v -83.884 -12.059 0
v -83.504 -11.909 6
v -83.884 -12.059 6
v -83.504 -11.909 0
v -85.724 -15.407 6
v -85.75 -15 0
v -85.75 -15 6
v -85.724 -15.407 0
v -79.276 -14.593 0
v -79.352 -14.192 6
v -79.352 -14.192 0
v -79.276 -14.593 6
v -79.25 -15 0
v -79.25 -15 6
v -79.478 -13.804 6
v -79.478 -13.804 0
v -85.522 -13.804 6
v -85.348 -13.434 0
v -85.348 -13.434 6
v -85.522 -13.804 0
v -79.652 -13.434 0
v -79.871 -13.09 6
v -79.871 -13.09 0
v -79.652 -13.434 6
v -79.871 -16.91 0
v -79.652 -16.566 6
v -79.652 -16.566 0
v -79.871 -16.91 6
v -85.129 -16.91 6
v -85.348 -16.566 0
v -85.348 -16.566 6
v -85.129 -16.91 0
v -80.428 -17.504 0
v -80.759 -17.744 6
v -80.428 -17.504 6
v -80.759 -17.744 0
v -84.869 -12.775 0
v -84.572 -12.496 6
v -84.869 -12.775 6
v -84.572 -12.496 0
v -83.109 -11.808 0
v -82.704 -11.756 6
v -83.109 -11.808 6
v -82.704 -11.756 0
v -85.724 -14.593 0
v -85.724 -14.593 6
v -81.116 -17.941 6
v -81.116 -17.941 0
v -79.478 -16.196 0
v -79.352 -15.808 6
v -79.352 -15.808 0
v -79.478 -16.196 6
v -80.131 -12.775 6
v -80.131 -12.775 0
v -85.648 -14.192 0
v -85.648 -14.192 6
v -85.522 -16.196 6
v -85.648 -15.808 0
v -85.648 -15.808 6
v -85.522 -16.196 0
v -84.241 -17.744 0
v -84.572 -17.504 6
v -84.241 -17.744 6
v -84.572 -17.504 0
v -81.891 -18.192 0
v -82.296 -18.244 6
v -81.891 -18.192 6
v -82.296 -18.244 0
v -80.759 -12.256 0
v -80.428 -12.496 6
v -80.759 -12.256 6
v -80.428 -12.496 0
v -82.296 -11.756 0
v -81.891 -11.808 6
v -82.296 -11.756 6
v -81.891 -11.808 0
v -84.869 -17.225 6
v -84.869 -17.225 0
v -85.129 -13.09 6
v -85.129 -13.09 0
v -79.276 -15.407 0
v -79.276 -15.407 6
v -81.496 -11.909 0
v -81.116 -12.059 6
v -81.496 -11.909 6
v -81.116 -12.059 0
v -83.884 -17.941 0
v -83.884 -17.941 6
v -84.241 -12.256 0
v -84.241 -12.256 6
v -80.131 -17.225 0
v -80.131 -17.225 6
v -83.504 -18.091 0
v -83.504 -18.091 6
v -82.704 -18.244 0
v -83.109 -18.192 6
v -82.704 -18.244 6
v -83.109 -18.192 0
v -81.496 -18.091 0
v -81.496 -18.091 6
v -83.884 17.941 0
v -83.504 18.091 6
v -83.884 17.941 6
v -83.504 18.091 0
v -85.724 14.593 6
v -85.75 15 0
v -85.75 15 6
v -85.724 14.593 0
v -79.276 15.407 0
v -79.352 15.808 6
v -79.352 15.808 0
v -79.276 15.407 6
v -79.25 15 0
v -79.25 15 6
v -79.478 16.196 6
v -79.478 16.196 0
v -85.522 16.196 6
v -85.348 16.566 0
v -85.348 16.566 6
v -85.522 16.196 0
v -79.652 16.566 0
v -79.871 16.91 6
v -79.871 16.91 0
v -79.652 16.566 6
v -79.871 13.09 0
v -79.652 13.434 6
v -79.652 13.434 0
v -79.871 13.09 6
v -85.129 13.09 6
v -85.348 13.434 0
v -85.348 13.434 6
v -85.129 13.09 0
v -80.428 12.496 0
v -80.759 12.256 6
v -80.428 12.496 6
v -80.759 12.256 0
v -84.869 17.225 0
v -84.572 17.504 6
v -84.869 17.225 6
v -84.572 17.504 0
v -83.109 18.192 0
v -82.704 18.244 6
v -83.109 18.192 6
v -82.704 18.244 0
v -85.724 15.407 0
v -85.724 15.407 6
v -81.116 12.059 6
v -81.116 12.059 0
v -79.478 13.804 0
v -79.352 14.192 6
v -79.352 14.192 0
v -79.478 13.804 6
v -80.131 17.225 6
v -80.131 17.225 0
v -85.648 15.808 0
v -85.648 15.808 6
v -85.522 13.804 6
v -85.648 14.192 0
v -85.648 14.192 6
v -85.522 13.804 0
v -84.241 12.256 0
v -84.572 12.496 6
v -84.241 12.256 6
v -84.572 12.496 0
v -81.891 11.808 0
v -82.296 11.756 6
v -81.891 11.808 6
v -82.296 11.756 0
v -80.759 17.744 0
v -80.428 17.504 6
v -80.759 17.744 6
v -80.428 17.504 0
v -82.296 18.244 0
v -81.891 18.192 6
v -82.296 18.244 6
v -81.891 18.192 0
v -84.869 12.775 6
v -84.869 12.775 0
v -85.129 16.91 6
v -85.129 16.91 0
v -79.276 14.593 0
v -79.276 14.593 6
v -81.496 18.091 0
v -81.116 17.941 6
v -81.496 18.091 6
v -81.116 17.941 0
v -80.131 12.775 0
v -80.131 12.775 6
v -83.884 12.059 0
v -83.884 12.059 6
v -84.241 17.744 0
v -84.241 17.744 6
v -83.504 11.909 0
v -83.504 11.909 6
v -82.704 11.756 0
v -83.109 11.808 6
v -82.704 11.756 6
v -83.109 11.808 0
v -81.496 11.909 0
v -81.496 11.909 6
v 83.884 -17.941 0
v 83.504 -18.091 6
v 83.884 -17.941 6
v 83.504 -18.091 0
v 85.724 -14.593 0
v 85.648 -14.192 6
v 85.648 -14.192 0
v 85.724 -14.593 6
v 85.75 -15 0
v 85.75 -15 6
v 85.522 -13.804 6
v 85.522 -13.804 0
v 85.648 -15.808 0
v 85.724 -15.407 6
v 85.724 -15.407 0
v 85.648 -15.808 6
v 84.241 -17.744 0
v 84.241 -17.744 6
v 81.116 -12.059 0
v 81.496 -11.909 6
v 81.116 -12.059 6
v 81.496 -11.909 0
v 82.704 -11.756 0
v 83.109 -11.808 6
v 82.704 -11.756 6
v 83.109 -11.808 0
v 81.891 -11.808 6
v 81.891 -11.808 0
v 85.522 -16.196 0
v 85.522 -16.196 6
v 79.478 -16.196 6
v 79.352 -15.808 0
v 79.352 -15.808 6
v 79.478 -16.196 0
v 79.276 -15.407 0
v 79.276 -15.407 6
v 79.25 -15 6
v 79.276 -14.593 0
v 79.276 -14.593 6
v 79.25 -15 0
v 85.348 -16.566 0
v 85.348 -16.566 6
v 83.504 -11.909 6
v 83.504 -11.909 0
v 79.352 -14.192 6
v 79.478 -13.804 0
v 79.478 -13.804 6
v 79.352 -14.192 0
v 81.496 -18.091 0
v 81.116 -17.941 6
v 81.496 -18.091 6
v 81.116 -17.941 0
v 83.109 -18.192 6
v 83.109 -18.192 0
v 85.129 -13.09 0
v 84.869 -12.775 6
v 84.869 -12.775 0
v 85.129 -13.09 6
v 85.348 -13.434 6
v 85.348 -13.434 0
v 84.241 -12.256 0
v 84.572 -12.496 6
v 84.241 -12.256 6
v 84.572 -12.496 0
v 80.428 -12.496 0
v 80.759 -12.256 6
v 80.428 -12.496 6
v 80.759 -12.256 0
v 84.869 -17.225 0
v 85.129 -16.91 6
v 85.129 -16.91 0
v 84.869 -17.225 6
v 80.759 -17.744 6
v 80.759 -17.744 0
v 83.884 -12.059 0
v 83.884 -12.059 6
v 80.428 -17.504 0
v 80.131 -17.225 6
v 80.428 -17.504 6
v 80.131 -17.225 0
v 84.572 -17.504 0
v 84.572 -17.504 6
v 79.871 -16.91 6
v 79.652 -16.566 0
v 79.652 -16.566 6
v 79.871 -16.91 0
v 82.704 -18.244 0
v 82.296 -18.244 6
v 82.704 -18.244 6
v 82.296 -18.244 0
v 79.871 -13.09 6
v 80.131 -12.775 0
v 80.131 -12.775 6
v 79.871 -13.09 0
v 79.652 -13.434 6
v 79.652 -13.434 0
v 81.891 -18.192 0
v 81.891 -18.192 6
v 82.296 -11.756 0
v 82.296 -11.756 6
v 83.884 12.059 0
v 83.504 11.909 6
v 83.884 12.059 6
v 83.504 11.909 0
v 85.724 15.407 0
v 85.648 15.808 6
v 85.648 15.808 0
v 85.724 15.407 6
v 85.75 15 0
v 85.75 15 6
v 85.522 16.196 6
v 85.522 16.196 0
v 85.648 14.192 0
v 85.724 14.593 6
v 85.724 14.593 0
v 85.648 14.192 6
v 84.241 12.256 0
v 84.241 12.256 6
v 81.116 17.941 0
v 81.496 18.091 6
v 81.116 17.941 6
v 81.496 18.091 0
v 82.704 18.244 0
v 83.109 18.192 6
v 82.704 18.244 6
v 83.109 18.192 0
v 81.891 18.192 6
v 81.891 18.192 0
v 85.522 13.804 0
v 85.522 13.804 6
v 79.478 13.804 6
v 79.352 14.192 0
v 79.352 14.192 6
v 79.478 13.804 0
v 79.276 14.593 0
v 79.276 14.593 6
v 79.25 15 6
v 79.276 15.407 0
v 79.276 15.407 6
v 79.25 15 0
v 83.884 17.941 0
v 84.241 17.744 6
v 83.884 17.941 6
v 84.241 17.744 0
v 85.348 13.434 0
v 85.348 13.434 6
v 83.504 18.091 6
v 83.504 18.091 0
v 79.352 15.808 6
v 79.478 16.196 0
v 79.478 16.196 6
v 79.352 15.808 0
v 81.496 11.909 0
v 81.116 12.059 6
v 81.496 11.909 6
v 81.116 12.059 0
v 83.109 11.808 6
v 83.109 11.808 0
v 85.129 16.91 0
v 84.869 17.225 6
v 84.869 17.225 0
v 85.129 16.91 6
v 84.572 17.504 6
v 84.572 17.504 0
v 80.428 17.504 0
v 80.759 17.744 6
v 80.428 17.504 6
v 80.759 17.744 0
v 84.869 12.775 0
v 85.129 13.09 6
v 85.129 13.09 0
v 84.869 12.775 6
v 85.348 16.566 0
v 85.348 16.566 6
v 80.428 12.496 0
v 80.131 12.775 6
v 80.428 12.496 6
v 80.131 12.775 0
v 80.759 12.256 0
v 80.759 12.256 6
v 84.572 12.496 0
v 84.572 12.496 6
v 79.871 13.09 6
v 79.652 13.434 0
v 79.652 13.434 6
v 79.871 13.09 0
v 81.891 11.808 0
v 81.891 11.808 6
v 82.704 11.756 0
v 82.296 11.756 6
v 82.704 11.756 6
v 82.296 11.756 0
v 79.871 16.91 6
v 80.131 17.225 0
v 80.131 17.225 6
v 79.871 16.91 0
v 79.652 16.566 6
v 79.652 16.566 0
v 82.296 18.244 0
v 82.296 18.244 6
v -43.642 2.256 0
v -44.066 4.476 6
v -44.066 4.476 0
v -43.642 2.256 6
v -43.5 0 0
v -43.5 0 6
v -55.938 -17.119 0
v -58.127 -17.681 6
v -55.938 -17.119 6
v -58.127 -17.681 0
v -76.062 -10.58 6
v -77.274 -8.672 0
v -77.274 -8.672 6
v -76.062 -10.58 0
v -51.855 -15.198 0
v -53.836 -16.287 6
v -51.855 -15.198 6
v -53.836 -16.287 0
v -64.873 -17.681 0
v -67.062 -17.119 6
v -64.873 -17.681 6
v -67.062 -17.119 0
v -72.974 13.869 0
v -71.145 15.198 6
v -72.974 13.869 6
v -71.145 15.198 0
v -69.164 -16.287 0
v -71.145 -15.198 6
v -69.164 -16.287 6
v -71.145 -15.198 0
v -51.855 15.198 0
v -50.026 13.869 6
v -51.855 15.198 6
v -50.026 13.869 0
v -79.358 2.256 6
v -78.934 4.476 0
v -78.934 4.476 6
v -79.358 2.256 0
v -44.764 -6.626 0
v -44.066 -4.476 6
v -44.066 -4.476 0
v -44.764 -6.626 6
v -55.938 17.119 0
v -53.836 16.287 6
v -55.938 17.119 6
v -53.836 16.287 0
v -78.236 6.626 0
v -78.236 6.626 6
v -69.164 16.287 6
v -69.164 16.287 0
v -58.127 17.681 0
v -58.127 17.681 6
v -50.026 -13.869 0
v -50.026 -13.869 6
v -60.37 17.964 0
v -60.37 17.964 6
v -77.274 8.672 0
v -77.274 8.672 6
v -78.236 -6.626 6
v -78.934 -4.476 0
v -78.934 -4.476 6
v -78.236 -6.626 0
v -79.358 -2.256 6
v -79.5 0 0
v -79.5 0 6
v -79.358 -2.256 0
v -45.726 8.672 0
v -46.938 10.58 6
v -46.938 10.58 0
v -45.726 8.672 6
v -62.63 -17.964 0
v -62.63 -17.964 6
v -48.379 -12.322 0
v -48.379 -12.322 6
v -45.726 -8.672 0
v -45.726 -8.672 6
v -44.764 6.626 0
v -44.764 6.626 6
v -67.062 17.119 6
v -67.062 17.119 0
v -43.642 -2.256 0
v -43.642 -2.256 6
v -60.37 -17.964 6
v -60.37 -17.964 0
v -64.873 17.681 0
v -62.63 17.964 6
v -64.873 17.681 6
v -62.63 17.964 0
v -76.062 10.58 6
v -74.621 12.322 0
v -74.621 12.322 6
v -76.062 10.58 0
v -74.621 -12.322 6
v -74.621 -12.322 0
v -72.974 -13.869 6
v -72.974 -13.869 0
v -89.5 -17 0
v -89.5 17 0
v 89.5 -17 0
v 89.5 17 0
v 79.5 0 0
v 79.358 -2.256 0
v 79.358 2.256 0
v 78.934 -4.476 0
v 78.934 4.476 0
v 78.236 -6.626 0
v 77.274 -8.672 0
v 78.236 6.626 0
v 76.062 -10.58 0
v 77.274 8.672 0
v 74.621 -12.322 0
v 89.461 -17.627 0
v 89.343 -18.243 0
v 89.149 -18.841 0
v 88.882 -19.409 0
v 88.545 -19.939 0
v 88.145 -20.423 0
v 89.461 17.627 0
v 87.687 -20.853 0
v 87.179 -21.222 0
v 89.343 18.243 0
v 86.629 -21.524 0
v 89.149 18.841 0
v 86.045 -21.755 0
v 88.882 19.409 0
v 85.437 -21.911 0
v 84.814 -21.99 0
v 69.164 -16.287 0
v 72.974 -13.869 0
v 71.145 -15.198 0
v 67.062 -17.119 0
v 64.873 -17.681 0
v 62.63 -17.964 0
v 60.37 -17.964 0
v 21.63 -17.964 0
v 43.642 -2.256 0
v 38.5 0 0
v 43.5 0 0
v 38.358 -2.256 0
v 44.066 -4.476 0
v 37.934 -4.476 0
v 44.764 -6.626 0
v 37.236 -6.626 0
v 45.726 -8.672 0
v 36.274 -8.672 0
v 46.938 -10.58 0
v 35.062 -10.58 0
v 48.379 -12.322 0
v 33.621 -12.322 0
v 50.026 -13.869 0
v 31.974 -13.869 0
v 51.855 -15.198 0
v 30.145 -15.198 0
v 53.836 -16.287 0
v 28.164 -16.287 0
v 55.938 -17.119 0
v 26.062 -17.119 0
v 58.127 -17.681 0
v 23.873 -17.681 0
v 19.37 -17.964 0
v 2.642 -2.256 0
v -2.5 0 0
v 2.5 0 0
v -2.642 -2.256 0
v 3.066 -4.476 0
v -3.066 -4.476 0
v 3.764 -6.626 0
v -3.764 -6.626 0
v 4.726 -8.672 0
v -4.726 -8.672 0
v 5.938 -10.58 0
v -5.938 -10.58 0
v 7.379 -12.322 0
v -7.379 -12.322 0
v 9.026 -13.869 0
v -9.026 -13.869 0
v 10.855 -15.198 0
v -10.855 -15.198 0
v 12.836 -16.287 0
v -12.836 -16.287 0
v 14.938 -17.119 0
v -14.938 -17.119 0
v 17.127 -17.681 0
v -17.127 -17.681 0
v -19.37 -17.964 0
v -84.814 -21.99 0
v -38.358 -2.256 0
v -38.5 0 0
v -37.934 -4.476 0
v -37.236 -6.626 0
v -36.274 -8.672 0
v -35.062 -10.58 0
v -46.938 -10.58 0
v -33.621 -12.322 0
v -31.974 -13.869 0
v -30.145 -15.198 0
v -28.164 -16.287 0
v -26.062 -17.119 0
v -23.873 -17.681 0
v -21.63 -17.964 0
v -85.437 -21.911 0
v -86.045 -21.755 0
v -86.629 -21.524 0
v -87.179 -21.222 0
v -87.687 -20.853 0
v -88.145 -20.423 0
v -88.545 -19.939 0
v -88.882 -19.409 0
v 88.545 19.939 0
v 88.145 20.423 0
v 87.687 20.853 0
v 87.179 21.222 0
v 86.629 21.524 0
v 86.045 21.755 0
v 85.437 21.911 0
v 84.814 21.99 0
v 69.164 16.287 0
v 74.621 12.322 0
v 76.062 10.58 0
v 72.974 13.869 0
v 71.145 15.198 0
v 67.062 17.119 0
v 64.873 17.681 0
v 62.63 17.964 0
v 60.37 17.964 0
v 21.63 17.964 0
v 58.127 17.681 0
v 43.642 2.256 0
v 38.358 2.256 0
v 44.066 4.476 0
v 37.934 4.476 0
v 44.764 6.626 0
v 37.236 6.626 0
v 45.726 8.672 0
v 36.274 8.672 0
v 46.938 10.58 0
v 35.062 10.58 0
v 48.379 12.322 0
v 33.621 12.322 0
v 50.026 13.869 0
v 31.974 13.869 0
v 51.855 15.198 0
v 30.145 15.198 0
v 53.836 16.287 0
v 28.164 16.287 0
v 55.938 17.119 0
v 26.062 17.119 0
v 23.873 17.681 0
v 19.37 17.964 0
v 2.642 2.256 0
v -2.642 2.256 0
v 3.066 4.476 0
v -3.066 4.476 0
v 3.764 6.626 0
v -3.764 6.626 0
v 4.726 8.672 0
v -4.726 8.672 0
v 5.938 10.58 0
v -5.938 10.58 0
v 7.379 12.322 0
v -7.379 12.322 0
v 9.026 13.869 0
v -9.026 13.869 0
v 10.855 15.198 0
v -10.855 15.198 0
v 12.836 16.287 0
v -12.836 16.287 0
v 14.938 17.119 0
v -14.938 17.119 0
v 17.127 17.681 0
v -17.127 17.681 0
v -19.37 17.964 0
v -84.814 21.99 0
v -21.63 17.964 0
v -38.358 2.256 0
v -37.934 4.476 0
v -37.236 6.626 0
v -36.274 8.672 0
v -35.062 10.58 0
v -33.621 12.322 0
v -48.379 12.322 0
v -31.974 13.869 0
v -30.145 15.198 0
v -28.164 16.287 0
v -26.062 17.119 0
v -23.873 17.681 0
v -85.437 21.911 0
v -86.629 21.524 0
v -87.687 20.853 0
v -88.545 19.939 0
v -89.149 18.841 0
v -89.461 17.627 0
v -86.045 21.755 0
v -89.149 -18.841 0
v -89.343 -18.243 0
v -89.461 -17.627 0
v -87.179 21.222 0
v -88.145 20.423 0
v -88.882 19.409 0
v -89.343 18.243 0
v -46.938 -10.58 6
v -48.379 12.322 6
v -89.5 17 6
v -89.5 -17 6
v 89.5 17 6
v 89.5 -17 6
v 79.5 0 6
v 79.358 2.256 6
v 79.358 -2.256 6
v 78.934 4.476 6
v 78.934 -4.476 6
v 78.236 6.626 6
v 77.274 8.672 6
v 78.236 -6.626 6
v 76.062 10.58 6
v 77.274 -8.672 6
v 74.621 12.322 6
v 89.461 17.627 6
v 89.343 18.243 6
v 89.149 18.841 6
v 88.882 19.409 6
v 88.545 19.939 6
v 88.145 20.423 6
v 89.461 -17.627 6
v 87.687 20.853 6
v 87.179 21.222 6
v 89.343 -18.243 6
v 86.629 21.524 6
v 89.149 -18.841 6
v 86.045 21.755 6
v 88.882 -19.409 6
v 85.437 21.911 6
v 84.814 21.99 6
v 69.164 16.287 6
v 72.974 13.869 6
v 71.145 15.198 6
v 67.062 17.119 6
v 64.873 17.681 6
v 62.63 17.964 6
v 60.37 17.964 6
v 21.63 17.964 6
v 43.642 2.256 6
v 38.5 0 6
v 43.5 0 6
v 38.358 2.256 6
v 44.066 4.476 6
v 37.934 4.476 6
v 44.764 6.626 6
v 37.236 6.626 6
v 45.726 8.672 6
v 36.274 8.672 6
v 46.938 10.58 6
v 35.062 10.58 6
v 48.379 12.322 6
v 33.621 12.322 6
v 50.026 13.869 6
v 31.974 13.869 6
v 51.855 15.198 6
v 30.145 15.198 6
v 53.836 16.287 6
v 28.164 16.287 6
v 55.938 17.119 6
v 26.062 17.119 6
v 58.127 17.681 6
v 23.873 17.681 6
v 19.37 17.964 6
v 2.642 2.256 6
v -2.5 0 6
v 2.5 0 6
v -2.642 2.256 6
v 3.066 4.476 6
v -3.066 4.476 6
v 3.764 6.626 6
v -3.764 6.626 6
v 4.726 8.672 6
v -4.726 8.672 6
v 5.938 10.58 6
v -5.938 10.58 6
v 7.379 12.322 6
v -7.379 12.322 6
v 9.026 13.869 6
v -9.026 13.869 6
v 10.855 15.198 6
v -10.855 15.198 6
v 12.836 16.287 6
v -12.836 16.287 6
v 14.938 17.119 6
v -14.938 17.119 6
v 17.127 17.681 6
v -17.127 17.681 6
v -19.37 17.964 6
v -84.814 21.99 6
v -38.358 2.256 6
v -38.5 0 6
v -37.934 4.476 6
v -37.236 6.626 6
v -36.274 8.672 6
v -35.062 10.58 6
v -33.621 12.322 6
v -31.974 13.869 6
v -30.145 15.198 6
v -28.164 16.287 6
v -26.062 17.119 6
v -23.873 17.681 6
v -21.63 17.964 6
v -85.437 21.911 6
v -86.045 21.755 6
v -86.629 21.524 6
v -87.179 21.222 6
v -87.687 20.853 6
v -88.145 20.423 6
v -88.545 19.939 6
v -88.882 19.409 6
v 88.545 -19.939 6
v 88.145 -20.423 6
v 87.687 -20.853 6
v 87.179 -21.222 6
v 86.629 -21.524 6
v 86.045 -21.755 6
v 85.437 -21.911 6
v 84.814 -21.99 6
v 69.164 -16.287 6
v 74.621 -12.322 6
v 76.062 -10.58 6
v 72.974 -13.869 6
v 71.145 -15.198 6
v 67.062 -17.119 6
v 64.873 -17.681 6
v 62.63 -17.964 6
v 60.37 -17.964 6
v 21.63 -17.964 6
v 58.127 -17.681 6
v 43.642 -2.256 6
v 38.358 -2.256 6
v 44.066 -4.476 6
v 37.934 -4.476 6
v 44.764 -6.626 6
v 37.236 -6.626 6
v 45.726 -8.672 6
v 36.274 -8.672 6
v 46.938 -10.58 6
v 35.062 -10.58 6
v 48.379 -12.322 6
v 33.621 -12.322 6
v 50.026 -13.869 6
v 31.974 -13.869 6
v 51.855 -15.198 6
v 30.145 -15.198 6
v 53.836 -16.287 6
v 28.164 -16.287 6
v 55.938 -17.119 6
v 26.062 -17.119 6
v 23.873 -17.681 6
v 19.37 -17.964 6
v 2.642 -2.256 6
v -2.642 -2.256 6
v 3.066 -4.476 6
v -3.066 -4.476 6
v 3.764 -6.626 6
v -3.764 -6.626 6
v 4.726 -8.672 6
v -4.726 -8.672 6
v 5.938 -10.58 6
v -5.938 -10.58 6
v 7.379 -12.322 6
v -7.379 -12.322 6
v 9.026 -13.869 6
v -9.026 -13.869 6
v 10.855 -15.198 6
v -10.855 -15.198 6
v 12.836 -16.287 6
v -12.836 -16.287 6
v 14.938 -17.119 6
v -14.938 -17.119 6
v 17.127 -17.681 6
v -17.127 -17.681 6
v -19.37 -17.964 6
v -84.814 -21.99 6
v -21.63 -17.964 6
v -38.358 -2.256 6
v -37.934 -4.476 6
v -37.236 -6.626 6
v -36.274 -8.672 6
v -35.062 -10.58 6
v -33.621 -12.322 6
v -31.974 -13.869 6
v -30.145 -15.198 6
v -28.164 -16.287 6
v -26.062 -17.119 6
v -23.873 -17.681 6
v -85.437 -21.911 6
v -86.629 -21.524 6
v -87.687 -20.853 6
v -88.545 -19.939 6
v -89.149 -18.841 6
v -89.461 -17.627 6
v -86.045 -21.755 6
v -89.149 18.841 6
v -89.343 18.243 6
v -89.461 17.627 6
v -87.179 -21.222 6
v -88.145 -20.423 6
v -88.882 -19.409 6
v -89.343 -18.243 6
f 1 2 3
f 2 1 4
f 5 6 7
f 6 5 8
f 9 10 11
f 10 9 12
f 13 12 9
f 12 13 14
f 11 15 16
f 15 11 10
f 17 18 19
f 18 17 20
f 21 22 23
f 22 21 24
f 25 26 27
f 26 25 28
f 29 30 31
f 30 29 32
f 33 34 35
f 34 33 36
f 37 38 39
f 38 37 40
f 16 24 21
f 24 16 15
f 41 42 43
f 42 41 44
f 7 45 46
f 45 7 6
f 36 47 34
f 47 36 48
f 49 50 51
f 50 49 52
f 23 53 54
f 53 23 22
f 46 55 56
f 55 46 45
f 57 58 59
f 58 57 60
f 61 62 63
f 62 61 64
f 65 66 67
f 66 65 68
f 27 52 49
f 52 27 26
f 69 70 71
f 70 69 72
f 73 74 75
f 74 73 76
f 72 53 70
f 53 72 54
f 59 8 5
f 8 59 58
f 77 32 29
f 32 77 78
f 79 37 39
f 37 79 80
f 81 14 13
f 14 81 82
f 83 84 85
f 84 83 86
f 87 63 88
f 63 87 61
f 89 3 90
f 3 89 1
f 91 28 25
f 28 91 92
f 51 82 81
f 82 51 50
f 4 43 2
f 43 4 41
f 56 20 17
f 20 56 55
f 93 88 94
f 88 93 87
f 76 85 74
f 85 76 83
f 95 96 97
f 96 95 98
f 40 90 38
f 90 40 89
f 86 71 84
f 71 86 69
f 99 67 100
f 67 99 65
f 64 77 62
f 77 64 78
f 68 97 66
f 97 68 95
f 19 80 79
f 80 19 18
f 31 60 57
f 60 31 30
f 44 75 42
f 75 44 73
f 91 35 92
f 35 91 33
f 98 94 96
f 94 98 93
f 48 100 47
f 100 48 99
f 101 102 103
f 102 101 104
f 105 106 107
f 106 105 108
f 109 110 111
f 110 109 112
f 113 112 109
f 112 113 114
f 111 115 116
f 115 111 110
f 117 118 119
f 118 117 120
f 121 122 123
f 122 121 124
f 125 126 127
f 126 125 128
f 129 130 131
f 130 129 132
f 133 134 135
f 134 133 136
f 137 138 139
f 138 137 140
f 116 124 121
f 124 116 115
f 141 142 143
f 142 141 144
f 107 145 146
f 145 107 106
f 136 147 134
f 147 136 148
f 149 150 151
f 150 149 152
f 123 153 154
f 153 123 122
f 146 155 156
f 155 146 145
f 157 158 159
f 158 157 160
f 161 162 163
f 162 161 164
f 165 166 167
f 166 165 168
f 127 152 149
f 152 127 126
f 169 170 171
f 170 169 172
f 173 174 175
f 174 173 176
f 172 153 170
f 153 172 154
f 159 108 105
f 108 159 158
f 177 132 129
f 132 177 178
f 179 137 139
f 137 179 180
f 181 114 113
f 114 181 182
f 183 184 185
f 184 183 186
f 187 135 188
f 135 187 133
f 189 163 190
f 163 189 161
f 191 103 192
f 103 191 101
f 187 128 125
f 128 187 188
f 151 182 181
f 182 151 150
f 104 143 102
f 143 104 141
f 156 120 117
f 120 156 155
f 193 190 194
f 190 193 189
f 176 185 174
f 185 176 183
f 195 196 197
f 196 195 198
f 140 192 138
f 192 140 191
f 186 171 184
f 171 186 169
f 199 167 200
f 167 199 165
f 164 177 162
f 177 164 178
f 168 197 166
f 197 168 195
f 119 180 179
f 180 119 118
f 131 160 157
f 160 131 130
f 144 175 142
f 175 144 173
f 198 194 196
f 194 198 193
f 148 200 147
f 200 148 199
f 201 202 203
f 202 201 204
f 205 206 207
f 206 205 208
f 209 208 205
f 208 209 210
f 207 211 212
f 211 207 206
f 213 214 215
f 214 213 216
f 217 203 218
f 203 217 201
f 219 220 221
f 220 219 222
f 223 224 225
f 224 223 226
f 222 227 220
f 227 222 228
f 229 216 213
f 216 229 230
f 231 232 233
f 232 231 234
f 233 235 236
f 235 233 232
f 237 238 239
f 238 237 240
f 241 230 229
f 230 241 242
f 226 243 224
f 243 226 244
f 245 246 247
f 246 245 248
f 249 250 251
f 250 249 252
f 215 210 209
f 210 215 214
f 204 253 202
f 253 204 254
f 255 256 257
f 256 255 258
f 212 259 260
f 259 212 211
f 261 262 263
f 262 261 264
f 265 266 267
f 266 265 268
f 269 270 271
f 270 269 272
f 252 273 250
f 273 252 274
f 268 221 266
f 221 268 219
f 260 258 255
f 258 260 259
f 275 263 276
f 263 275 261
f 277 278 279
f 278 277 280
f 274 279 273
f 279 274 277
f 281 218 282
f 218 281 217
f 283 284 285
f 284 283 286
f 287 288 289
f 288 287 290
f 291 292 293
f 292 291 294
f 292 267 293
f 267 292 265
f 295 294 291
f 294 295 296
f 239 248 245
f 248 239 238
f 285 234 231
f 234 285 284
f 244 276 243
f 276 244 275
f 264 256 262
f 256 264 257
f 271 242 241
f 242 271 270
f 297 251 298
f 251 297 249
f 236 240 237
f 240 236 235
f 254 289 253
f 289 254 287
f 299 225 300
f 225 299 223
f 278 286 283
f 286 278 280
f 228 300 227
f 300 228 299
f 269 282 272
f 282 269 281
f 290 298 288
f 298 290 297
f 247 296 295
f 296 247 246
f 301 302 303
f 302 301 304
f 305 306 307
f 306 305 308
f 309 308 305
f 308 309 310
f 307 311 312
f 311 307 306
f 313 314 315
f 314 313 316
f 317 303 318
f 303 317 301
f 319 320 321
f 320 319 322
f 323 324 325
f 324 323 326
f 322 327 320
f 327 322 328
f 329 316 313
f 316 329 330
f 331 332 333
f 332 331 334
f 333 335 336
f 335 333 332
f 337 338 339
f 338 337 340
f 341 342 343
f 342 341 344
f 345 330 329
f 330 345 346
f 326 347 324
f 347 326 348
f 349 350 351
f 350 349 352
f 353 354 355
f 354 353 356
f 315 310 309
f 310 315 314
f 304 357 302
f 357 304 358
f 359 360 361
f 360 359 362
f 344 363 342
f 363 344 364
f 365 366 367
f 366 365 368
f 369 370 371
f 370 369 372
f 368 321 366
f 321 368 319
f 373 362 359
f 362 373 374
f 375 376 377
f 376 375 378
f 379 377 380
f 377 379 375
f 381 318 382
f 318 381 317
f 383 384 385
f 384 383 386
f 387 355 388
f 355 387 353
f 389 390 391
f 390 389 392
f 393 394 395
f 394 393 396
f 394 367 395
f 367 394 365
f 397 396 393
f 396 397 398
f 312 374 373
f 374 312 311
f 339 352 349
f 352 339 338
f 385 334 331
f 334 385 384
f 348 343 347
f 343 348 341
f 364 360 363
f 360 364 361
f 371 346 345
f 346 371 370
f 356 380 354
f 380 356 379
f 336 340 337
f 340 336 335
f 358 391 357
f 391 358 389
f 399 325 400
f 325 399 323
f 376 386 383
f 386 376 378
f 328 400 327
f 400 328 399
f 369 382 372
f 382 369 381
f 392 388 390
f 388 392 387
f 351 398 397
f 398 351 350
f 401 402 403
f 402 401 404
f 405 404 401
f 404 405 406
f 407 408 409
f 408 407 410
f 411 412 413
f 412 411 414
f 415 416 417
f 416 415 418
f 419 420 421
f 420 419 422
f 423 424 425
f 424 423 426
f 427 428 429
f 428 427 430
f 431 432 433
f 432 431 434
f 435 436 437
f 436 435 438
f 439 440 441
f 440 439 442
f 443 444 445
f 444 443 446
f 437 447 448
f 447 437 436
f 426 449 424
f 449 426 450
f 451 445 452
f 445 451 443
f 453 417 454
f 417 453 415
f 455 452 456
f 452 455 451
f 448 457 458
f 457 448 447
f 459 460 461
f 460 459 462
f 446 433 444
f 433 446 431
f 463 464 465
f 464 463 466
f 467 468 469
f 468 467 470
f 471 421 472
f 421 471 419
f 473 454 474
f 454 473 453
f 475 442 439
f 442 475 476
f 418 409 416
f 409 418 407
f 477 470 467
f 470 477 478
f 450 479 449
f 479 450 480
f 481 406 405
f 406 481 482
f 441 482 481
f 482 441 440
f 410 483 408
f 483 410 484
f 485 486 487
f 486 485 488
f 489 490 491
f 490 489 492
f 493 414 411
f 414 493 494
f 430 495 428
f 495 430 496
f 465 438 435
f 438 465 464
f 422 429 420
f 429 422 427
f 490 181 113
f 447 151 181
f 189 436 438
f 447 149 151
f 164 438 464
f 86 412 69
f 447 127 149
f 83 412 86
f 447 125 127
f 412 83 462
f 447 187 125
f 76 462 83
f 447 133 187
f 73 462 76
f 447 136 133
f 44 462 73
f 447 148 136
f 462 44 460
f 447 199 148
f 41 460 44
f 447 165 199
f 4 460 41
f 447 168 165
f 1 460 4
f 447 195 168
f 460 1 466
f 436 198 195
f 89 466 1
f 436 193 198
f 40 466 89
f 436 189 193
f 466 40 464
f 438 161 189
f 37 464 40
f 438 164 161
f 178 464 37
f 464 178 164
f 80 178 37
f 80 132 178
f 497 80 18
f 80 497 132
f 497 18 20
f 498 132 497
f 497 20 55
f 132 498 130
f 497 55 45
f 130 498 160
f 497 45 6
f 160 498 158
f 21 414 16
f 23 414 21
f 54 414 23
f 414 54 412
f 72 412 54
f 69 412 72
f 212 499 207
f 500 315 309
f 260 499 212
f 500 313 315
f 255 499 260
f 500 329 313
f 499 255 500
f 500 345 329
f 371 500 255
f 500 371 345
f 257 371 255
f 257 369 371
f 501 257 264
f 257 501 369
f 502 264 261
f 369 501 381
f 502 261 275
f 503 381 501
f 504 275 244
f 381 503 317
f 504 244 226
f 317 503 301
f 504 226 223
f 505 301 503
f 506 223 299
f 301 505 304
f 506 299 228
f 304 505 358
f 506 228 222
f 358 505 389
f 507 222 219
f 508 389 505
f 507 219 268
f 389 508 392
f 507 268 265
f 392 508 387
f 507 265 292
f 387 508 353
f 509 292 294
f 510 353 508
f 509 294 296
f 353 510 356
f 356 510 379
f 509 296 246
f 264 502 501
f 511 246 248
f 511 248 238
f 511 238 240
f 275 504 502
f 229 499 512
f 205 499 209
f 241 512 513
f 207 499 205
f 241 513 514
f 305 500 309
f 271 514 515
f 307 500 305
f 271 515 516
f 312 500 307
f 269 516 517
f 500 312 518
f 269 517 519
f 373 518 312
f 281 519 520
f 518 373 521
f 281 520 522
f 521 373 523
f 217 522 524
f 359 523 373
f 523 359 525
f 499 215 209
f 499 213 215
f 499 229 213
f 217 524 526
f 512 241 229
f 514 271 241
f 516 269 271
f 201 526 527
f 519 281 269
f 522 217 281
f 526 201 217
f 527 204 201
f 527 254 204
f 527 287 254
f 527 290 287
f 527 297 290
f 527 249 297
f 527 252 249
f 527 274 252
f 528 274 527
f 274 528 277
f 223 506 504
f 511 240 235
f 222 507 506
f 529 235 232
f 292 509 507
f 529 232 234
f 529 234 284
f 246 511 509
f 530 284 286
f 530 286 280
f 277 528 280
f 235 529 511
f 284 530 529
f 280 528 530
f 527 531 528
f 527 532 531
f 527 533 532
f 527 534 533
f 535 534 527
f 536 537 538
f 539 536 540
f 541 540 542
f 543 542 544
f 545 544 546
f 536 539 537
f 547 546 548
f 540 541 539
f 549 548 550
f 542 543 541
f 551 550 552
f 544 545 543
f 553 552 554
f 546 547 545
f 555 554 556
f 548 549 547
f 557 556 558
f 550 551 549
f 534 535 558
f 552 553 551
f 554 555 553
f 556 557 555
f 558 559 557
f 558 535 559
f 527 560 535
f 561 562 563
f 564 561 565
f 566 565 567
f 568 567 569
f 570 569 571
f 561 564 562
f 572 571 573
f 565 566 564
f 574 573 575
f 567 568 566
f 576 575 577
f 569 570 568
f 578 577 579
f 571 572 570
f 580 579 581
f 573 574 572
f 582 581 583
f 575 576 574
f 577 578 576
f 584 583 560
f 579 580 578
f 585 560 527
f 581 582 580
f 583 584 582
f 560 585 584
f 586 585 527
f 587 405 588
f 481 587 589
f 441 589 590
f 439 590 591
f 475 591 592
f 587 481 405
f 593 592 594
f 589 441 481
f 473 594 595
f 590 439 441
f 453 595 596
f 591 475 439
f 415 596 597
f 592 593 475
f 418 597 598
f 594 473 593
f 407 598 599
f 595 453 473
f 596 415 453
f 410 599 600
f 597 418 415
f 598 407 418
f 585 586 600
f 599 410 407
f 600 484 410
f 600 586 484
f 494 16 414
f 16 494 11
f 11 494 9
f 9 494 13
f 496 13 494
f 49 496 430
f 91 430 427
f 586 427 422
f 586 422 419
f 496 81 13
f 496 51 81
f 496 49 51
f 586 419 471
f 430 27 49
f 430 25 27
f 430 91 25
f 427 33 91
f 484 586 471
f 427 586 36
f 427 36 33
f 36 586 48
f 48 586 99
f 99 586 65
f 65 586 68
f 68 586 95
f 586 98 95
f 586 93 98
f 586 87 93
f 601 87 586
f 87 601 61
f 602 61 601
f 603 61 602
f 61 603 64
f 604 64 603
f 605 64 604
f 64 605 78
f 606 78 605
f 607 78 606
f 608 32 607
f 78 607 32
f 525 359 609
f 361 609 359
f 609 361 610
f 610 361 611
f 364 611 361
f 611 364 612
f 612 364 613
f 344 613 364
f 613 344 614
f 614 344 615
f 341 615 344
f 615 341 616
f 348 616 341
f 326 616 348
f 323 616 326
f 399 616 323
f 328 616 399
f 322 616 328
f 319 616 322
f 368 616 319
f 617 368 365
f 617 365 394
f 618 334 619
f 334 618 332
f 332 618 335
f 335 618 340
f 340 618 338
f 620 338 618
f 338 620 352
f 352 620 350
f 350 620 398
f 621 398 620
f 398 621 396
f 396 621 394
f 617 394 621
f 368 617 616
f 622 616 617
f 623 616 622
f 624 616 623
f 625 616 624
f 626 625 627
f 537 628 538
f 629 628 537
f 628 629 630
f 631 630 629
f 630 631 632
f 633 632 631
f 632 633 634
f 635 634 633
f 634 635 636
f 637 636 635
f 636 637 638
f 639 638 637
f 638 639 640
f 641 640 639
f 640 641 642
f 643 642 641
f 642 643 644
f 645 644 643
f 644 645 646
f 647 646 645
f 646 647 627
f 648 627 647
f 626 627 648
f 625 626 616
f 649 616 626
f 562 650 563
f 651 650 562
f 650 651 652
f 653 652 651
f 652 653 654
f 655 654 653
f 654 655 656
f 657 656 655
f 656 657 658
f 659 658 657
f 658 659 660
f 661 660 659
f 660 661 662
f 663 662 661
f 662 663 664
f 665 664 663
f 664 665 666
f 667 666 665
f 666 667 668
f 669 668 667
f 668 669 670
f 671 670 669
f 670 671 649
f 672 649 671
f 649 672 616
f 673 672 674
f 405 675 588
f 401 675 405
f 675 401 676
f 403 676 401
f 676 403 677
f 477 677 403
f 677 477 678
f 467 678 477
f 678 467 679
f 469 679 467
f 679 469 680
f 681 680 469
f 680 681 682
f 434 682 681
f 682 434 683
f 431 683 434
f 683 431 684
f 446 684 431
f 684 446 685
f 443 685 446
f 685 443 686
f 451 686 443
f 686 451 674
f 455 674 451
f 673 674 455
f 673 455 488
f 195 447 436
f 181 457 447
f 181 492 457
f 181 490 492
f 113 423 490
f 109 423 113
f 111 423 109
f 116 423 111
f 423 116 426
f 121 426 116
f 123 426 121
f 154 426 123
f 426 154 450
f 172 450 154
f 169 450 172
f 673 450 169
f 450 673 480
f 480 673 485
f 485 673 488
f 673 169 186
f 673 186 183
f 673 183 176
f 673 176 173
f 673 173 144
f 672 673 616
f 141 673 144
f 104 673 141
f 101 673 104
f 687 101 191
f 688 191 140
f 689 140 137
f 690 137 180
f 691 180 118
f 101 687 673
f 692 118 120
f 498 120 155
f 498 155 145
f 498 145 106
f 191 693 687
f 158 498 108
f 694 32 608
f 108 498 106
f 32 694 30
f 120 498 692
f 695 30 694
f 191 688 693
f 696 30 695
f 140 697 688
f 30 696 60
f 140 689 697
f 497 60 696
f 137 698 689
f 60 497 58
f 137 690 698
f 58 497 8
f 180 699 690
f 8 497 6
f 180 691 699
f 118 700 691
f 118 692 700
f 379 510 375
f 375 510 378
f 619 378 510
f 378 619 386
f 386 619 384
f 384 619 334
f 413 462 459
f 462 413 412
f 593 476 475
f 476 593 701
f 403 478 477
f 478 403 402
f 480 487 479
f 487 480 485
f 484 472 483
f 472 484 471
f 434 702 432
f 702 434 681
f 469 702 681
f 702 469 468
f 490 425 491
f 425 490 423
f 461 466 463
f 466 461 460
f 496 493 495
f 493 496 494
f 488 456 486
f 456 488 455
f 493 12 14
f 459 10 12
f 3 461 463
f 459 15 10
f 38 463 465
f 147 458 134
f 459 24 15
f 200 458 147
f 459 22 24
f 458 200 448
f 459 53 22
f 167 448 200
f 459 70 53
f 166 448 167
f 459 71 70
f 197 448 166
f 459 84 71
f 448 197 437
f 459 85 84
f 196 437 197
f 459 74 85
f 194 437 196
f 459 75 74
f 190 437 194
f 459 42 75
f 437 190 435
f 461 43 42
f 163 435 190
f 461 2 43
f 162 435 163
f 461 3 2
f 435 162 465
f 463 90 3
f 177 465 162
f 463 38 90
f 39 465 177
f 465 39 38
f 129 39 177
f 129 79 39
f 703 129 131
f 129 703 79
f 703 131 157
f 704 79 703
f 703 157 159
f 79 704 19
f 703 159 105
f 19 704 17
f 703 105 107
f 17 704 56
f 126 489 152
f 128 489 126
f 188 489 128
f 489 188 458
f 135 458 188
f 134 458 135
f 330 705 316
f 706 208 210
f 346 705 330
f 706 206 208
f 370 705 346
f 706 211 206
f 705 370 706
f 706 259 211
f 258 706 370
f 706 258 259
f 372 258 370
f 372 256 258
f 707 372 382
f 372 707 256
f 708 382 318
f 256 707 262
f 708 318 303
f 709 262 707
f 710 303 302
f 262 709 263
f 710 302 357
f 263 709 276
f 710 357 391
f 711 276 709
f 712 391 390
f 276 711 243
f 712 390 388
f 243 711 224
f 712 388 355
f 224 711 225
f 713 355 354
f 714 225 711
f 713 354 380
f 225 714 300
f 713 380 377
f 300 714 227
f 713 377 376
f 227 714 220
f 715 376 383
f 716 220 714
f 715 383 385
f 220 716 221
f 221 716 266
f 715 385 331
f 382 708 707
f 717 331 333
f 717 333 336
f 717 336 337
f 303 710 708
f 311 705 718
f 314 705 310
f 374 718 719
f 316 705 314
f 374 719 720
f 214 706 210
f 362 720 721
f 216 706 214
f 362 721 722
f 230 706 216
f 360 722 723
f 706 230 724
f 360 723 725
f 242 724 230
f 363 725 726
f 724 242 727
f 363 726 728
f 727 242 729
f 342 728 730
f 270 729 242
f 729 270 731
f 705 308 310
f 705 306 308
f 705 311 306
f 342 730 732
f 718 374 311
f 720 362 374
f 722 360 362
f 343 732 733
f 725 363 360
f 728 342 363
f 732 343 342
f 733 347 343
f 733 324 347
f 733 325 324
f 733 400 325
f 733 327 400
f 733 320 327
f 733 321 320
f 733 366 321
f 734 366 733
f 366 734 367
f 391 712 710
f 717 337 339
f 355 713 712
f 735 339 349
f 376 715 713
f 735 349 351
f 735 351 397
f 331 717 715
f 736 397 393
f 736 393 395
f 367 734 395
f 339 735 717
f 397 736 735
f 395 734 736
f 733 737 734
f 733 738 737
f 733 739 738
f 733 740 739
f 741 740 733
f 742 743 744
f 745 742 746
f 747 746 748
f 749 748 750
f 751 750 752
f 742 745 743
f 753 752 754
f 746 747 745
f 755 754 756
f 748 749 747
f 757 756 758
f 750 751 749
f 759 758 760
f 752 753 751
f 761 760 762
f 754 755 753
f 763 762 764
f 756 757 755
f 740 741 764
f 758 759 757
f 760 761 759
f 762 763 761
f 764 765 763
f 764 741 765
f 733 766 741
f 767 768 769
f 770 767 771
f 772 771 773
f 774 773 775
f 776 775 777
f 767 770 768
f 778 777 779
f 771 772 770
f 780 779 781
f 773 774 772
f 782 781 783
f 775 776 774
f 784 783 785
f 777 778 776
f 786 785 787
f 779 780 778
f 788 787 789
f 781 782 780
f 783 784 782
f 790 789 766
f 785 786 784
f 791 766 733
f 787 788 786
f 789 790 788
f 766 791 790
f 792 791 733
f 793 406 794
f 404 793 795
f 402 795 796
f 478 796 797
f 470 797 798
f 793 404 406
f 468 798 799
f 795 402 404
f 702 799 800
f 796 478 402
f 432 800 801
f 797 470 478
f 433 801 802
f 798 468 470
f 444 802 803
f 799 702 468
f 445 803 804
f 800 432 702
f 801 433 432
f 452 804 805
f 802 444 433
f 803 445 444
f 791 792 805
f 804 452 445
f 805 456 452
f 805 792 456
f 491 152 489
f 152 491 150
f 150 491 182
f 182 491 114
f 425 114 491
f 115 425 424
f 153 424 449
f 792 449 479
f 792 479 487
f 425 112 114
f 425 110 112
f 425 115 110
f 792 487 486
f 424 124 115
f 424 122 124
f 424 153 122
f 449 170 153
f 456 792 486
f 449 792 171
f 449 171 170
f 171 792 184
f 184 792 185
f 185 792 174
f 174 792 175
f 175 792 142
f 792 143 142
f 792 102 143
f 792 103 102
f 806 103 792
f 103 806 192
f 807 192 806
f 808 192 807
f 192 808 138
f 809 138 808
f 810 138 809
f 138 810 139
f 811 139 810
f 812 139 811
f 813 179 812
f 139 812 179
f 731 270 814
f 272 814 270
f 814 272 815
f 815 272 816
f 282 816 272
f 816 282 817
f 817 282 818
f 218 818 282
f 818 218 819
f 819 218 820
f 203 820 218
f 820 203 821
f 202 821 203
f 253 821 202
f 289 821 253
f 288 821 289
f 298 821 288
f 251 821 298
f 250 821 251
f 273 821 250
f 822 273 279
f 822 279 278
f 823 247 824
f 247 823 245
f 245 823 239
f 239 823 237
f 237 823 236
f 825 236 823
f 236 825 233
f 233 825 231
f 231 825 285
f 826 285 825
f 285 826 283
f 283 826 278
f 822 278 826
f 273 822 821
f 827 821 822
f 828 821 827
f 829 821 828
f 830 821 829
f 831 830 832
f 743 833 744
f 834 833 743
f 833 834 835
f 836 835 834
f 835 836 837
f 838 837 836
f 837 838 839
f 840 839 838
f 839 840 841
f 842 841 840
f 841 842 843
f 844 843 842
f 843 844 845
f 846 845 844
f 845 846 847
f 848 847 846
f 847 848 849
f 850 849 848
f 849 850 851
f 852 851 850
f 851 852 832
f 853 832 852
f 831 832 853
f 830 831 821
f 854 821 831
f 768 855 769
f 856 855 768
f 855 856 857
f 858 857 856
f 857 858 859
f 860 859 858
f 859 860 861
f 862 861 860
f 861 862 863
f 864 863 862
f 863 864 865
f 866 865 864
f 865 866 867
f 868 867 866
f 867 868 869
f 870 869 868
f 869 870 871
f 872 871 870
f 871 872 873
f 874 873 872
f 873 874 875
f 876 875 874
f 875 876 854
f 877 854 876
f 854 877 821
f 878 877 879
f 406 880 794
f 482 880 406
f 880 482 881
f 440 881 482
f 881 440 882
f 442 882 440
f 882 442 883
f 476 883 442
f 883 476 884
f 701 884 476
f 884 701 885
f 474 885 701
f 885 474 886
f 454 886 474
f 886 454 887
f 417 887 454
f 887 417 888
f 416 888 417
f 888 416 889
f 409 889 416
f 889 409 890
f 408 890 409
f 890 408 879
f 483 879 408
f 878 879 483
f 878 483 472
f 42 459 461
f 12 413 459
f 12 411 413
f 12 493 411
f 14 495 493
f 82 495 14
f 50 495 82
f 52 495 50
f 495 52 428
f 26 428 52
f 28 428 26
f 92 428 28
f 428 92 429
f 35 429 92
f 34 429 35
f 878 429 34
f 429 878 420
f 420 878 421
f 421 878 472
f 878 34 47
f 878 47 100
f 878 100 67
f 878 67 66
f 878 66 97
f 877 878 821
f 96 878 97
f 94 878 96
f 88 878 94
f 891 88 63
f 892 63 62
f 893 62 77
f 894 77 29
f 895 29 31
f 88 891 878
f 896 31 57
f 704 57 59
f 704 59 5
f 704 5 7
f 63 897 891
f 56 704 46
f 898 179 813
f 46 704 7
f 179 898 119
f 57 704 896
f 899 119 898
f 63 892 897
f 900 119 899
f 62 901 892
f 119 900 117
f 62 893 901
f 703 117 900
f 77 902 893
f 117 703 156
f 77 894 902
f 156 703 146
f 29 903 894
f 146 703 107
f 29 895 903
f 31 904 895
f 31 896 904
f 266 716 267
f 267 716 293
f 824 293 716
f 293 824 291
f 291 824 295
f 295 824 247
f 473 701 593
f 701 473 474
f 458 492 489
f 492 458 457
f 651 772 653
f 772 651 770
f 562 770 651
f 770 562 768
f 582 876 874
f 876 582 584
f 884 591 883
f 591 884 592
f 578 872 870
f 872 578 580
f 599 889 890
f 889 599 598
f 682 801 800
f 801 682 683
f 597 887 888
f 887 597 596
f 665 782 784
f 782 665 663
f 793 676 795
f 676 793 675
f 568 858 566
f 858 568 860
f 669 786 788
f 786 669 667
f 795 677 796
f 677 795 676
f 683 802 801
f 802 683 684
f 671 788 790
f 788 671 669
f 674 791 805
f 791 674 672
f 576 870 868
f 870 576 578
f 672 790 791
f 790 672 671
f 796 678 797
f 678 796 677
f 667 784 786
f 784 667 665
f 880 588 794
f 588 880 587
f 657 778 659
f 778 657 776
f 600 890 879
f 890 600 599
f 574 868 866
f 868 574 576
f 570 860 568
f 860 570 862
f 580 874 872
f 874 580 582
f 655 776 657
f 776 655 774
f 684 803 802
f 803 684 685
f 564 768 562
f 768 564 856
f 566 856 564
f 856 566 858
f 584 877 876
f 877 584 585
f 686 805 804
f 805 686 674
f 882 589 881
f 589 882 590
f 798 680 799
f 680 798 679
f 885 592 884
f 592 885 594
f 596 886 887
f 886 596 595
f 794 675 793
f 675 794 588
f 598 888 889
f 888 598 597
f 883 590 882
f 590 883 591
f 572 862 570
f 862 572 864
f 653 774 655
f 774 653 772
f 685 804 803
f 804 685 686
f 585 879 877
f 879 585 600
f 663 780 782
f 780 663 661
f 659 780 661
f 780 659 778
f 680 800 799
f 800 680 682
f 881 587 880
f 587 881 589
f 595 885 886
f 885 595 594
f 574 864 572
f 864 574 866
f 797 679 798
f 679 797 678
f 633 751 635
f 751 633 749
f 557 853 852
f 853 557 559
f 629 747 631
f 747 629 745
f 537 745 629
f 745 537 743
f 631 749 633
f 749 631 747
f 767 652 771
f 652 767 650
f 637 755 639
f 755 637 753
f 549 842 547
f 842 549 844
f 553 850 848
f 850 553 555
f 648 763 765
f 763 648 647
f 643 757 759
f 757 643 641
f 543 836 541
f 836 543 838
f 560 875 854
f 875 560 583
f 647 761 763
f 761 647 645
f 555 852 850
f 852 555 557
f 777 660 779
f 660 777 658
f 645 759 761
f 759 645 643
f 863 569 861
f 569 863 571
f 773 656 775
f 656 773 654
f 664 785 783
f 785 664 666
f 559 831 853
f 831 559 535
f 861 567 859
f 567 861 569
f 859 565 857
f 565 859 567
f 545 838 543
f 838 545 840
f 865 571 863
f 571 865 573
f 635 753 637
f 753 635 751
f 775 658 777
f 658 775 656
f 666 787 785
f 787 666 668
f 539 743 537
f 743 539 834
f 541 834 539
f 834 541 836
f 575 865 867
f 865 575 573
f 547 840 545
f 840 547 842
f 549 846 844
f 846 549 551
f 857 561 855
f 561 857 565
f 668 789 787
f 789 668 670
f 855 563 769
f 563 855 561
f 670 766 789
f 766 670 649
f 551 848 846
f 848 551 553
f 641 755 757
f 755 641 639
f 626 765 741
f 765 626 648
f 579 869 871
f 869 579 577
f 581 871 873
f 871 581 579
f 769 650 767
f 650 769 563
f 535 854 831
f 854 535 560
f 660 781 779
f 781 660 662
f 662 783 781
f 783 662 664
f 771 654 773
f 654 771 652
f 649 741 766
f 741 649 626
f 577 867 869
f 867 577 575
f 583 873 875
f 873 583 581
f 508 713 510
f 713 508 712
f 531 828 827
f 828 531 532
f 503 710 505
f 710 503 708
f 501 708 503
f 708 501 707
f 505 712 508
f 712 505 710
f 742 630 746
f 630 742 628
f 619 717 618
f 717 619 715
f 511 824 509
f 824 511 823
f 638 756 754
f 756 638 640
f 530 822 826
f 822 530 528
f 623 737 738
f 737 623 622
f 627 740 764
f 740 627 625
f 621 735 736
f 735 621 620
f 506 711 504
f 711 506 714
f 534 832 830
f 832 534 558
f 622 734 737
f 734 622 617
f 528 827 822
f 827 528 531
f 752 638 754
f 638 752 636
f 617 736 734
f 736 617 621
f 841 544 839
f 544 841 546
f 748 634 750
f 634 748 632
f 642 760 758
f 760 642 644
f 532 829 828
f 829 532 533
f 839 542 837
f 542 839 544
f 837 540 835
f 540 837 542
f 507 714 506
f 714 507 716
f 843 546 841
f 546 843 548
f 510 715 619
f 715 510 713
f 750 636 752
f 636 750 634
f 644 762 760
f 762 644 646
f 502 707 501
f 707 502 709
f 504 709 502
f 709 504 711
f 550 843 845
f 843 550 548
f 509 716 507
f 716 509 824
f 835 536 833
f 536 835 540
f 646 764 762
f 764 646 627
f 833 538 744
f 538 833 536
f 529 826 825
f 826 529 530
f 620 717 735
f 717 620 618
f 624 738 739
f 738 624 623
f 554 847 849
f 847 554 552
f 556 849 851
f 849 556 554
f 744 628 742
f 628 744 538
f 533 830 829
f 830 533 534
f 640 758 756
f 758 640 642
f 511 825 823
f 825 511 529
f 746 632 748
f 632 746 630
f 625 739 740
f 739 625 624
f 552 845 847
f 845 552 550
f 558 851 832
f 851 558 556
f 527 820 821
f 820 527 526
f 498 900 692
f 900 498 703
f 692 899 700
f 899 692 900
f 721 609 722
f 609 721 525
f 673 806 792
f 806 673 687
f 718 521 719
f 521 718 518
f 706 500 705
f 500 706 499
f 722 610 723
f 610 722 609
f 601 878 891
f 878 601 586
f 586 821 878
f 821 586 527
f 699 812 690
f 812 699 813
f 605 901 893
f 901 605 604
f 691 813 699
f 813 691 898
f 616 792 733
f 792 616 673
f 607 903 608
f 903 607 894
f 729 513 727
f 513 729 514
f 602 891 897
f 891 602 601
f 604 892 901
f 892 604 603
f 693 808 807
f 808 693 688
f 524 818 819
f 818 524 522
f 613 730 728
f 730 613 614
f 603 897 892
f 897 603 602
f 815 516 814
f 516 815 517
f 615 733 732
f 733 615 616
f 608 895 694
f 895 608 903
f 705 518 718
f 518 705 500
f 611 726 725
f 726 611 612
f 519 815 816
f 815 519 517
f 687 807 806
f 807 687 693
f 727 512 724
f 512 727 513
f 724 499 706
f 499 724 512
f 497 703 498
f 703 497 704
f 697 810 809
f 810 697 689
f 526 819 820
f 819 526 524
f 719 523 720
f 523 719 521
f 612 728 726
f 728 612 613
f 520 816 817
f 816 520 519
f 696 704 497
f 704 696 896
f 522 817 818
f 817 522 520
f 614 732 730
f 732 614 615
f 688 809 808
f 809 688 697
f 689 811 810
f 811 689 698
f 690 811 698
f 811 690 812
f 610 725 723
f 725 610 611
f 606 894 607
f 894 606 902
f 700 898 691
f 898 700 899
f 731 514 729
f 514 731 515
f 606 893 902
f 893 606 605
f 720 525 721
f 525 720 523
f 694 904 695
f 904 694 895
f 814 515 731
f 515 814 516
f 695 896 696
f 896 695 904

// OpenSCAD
$fn = 50;


difference() {
	union() {
		hull() {
			translate(v = [-84.5000000000, 17.0000000000, 0]) {
				cylinder(h = 6, r = 5);
			}
			translate(v = [84.5000000000, 17.0000000000, 0]) {
				cylinder(h = 6, r = 5);
			}
			translate(v = [-84.5000000000, -17.0000000000, 0]) {
				cylinder(h = 6, r = 5);
			}
			translate(v = [84.5000000000, -17.0000000000, 0]) {
				cylinder(h = 6, r = 5);
			}
		}
	}
	union() {
		#translate(v = [-82.5000000000, -15.0000000000, -100.0000000000]) {
			cylinder(h = 200, r = 3.2500000000);
		}
		#translate(v = [-82.5000000000, 15.0000000000, -100.0000000000]) {
			cylinder(h = 200, r = 3.2500000000);
		}
		#translate(v = [82.5000000000, -15.0000000000, -100.0000000000]) {
			cylinder(h = 200, r = 3.2500000000);
		}
		#translate(v = [82.5000000000, 15.0000000000, -100.0000000000]) {
			cylinder(h = 200, r = 3.2500000000);
		}
		#translate(v = [-61.5000000000, 0, 0]) {
			cylinder(h = 6, r = 18.0000000000);
		}
		#translate(v = [-20.5000000000, 0, 0]) {
			cylinder(h = 6, r = 18.0000000000);
		}
		#translate(v = [20.5000000000, 0, 0]) {
			cylinder(h = 6, r = 18.0000000000);
		}
		#translate(v = [61.5000000000, 0, 0]) {
			cylinder(h = 6, r = 18.0000000000);
		}
	}
}
